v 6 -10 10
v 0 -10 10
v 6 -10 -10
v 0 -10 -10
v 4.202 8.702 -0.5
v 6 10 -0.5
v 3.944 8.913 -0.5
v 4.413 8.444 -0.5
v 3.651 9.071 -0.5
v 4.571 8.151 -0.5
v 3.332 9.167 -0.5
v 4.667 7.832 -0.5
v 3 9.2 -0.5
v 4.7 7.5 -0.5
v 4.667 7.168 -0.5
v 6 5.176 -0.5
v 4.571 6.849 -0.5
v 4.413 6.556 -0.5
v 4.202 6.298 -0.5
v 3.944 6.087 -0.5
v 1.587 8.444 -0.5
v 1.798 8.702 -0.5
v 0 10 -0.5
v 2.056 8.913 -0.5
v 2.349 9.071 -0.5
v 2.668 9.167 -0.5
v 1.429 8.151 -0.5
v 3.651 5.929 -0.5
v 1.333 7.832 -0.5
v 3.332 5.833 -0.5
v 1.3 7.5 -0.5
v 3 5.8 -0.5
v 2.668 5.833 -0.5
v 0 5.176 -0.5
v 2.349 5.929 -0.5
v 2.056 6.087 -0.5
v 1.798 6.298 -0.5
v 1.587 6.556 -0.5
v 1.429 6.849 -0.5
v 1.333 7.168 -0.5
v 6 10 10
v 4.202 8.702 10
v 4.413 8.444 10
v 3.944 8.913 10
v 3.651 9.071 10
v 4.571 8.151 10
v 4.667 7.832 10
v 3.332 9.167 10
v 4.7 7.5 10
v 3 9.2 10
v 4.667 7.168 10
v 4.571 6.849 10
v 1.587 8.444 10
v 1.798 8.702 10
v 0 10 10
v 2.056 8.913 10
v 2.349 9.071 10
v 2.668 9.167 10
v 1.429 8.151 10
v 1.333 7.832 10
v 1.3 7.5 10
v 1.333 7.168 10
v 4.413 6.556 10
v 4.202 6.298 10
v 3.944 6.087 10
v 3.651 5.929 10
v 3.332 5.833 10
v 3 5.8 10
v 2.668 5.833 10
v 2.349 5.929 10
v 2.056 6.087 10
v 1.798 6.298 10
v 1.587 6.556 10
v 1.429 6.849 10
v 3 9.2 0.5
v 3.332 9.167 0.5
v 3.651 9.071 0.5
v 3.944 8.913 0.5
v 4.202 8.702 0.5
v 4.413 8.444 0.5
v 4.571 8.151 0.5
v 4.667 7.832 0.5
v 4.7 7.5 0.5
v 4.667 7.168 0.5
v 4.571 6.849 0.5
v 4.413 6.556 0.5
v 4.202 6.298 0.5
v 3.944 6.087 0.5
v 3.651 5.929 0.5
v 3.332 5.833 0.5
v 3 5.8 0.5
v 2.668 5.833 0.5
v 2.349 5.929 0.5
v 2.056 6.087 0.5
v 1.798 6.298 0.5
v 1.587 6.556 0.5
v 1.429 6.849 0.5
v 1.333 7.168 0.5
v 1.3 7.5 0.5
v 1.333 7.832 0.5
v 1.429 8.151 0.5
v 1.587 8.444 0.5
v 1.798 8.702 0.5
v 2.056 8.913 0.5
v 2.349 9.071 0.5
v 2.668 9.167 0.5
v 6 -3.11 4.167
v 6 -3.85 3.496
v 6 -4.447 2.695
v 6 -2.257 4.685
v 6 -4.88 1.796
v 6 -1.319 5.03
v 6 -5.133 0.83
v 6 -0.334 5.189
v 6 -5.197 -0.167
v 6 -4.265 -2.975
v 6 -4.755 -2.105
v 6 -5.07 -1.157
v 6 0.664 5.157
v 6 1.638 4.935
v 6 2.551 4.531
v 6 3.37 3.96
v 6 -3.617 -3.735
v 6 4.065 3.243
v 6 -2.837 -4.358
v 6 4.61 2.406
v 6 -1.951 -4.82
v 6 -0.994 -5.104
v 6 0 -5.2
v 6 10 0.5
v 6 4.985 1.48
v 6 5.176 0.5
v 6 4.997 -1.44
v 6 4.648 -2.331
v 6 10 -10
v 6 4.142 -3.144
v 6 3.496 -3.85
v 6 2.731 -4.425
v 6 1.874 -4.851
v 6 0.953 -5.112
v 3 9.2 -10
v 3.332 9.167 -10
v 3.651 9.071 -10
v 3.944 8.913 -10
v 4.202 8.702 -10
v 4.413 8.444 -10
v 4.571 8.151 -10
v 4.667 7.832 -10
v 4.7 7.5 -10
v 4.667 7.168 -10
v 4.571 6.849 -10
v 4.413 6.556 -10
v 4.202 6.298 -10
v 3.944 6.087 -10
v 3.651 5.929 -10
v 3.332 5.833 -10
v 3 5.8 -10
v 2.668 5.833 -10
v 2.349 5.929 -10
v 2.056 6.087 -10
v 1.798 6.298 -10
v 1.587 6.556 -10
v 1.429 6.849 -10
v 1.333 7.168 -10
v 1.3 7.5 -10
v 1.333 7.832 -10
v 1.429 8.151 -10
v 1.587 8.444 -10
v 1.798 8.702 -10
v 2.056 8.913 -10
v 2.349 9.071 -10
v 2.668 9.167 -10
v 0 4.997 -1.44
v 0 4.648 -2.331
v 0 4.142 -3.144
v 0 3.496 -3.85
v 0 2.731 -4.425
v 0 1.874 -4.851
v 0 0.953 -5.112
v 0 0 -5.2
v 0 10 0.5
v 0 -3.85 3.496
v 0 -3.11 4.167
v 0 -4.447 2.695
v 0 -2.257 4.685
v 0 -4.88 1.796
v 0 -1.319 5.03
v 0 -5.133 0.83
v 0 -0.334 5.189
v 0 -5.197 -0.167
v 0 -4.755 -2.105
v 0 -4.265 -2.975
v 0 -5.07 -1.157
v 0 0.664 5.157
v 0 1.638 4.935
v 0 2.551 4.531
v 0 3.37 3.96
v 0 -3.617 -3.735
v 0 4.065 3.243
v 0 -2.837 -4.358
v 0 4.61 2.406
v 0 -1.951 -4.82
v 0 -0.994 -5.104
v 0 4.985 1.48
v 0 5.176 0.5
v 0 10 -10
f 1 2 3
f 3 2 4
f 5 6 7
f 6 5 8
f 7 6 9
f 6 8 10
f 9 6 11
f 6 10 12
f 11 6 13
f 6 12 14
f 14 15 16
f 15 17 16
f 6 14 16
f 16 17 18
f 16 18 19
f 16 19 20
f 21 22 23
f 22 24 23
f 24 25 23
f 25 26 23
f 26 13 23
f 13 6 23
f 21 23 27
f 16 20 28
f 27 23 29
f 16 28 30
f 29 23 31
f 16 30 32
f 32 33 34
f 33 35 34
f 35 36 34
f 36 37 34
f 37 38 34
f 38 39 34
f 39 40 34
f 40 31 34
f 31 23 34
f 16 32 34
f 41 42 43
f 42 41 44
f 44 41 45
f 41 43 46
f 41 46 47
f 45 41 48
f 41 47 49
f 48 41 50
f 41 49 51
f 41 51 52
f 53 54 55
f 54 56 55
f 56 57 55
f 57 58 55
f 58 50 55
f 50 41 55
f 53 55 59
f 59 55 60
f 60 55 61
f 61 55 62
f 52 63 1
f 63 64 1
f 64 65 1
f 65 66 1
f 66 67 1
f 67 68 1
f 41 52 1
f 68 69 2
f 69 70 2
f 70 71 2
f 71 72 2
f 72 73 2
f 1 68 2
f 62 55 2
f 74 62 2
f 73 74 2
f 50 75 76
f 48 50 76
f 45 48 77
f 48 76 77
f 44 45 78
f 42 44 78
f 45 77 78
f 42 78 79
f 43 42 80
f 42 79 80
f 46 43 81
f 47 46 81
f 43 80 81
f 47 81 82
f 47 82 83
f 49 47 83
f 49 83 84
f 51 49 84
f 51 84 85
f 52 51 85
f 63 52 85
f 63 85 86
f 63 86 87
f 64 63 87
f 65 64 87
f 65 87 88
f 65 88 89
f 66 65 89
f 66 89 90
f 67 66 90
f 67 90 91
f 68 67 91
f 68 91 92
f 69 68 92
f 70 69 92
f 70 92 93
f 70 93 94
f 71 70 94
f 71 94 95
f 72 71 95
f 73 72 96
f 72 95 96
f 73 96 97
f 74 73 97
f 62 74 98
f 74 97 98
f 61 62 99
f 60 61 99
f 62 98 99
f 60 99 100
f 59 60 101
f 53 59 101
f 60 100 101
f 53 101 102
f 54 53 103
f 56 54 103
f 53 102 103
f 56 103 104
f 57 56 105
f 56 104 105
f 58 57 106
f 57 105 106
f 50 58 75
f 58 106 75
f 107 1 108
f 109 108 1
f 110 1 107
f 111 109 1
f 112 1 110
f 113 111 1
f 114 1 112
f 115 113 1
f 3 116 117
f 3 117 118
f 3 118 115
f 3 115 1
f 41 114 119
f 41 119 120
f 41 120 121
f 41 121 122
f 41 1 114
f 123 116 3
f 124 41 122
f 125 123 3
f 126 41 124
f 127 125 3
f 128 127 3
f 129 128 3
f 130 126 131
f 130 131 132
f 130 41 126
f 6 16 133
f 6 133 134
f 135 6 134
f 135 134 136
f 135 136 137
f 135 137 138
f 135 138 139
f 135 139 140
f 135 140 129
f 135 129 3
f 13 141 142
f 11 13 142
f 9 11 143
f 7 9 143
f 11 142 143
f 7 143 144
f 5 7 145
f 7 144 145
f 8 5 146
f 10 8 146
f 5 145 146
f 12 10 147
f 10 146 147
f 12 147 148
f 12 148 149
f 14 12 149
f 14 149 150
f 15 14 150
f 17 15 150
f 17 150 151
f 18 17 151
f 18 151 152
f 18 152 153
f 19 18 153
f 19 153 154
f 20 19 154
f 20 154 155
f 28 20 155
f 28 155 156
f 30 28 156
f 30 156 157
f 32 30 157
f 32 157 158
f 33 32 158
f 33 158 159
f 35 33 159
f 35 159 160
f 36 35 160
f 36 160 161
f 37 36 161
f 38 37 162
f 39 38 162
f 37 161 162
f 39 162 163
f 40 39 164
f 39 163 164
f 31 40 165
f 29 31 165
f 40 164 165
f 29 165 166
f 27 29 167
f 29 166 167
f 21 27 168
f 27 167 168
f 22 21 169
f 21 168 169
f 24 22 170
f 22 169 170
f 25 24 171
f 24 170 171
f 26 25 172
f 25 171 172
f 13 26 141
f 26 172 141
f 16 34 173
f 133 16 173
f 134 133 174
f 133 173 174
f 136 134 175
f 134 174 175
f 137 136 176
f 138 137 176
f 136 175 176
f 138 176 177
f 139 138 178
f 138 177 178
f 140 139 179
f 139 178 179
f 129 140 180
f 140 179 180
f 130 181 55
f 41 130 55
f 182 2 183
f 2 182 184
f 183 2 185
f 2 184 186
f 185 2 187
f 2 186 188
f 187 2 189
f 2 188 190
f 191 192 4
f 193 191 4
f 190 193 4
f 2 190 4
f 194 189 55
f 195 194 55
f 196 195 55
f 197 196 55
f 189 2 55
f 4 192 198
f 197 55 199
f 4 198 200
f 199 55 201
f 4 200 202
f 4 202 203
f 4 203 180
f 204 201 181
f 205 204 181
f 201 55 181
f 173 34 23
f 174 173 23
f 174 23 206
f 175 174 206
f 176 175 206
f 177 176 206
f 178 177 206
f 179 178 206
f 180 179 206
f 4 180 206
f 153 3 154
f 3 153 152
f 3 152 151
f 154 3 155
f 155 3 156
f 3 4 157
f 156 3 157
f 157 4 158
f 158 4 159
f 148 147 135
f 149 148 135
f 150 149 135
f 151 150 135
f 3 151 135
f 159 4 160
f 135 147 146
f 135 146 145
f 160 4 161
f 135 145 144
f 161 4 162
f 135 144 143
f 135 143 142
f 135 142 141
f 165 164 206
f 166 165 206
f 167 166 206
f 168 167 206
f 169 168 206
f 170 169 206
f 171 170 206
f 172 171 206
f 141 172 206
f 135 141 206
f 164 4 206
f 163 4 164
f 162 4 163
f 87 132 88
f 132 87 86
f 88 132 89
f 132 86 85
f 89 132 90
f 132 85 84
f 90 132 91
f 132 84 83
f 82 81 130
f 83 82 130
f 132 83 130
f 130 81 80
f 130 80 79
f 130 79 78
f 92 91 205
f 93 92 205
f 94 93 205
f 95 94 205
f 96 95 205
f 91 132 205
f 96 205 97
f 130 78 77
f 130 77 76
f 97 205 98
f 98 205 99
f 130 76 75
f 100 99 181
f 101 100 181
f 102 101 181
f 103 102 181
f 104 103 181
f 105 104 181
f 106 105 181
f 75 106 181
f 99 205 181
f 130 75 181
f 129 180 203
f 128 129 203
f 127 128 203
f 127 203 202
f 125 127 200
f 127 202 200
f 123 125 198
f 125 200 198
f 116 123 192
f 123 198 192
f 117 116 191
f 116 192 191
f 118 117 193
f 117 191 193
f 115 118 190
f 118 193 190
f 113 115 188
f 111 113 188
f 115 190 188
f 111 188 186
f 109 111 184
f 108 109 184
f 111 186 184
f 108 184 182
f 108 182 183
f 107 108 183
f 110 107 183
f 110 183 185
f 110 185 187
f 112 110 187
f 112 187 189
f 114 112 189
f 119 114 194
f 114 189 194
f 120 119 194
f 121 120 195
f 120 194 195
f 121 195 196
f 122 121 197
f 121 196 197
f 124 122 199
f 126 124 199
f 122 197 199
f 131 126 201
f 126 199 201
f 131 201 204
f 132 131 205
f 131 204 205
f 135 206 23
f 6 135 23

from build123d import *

# Parameters (mm, degrees)
BOSS_EXTRUDE1_DEPTH = 6
SKETCH2_R           = 1.7
CUT_EXTRUDE1_DEPTH  = 24.151673806


with BuildPart() as part:
    # Sketch1 → Boss-Extrude1 (new body)
    with BuildSketch(Plane(origin=(0, 0, 0), x_dir=(0, 0, -1), z_dir=(1, 0, 0))):
        with BuildLine():
            Line((-0.5, 5.175905718), (-0.5, 10))
            Line((-0.5, 10), (-10, 10))
            Line((-10, 10), (-10, -10))
            Line((-10, -10), (10, -10))
            Line((10, -10), (10, 10))
            Line((10, 10), (0.5, 10))
            Line((0.5, 10), (0.5, 5.175905718))
            ThreePointArc((0.5, 5.175905718), (3.849675311, 3.495711659), (5.2, 0))
            ThreePointArc((5.2, 0), (-3.495711659, -3.849675311), (-0.5, 5.175905718))
        make_face()
    extrude(amount=BOSS_EXTRUDE1_DEPTH)

    # Sketch2 → Cut-Extrude1 (cut, through all)
    with BuildSketch(Plane(origin=(0, 0, -10), x_dir=(-1, 0, 0), z_dir=(0, 0, -1))):
        with Locations(Location((-3, 7.5, 0), (0, 0, 90))):
            Circle(SKETCH2_R)
    extrude(amount=-CUT_EXTRUDE1_DEPTH, mode=Mode.SUBTRACT)


solid = part.part
